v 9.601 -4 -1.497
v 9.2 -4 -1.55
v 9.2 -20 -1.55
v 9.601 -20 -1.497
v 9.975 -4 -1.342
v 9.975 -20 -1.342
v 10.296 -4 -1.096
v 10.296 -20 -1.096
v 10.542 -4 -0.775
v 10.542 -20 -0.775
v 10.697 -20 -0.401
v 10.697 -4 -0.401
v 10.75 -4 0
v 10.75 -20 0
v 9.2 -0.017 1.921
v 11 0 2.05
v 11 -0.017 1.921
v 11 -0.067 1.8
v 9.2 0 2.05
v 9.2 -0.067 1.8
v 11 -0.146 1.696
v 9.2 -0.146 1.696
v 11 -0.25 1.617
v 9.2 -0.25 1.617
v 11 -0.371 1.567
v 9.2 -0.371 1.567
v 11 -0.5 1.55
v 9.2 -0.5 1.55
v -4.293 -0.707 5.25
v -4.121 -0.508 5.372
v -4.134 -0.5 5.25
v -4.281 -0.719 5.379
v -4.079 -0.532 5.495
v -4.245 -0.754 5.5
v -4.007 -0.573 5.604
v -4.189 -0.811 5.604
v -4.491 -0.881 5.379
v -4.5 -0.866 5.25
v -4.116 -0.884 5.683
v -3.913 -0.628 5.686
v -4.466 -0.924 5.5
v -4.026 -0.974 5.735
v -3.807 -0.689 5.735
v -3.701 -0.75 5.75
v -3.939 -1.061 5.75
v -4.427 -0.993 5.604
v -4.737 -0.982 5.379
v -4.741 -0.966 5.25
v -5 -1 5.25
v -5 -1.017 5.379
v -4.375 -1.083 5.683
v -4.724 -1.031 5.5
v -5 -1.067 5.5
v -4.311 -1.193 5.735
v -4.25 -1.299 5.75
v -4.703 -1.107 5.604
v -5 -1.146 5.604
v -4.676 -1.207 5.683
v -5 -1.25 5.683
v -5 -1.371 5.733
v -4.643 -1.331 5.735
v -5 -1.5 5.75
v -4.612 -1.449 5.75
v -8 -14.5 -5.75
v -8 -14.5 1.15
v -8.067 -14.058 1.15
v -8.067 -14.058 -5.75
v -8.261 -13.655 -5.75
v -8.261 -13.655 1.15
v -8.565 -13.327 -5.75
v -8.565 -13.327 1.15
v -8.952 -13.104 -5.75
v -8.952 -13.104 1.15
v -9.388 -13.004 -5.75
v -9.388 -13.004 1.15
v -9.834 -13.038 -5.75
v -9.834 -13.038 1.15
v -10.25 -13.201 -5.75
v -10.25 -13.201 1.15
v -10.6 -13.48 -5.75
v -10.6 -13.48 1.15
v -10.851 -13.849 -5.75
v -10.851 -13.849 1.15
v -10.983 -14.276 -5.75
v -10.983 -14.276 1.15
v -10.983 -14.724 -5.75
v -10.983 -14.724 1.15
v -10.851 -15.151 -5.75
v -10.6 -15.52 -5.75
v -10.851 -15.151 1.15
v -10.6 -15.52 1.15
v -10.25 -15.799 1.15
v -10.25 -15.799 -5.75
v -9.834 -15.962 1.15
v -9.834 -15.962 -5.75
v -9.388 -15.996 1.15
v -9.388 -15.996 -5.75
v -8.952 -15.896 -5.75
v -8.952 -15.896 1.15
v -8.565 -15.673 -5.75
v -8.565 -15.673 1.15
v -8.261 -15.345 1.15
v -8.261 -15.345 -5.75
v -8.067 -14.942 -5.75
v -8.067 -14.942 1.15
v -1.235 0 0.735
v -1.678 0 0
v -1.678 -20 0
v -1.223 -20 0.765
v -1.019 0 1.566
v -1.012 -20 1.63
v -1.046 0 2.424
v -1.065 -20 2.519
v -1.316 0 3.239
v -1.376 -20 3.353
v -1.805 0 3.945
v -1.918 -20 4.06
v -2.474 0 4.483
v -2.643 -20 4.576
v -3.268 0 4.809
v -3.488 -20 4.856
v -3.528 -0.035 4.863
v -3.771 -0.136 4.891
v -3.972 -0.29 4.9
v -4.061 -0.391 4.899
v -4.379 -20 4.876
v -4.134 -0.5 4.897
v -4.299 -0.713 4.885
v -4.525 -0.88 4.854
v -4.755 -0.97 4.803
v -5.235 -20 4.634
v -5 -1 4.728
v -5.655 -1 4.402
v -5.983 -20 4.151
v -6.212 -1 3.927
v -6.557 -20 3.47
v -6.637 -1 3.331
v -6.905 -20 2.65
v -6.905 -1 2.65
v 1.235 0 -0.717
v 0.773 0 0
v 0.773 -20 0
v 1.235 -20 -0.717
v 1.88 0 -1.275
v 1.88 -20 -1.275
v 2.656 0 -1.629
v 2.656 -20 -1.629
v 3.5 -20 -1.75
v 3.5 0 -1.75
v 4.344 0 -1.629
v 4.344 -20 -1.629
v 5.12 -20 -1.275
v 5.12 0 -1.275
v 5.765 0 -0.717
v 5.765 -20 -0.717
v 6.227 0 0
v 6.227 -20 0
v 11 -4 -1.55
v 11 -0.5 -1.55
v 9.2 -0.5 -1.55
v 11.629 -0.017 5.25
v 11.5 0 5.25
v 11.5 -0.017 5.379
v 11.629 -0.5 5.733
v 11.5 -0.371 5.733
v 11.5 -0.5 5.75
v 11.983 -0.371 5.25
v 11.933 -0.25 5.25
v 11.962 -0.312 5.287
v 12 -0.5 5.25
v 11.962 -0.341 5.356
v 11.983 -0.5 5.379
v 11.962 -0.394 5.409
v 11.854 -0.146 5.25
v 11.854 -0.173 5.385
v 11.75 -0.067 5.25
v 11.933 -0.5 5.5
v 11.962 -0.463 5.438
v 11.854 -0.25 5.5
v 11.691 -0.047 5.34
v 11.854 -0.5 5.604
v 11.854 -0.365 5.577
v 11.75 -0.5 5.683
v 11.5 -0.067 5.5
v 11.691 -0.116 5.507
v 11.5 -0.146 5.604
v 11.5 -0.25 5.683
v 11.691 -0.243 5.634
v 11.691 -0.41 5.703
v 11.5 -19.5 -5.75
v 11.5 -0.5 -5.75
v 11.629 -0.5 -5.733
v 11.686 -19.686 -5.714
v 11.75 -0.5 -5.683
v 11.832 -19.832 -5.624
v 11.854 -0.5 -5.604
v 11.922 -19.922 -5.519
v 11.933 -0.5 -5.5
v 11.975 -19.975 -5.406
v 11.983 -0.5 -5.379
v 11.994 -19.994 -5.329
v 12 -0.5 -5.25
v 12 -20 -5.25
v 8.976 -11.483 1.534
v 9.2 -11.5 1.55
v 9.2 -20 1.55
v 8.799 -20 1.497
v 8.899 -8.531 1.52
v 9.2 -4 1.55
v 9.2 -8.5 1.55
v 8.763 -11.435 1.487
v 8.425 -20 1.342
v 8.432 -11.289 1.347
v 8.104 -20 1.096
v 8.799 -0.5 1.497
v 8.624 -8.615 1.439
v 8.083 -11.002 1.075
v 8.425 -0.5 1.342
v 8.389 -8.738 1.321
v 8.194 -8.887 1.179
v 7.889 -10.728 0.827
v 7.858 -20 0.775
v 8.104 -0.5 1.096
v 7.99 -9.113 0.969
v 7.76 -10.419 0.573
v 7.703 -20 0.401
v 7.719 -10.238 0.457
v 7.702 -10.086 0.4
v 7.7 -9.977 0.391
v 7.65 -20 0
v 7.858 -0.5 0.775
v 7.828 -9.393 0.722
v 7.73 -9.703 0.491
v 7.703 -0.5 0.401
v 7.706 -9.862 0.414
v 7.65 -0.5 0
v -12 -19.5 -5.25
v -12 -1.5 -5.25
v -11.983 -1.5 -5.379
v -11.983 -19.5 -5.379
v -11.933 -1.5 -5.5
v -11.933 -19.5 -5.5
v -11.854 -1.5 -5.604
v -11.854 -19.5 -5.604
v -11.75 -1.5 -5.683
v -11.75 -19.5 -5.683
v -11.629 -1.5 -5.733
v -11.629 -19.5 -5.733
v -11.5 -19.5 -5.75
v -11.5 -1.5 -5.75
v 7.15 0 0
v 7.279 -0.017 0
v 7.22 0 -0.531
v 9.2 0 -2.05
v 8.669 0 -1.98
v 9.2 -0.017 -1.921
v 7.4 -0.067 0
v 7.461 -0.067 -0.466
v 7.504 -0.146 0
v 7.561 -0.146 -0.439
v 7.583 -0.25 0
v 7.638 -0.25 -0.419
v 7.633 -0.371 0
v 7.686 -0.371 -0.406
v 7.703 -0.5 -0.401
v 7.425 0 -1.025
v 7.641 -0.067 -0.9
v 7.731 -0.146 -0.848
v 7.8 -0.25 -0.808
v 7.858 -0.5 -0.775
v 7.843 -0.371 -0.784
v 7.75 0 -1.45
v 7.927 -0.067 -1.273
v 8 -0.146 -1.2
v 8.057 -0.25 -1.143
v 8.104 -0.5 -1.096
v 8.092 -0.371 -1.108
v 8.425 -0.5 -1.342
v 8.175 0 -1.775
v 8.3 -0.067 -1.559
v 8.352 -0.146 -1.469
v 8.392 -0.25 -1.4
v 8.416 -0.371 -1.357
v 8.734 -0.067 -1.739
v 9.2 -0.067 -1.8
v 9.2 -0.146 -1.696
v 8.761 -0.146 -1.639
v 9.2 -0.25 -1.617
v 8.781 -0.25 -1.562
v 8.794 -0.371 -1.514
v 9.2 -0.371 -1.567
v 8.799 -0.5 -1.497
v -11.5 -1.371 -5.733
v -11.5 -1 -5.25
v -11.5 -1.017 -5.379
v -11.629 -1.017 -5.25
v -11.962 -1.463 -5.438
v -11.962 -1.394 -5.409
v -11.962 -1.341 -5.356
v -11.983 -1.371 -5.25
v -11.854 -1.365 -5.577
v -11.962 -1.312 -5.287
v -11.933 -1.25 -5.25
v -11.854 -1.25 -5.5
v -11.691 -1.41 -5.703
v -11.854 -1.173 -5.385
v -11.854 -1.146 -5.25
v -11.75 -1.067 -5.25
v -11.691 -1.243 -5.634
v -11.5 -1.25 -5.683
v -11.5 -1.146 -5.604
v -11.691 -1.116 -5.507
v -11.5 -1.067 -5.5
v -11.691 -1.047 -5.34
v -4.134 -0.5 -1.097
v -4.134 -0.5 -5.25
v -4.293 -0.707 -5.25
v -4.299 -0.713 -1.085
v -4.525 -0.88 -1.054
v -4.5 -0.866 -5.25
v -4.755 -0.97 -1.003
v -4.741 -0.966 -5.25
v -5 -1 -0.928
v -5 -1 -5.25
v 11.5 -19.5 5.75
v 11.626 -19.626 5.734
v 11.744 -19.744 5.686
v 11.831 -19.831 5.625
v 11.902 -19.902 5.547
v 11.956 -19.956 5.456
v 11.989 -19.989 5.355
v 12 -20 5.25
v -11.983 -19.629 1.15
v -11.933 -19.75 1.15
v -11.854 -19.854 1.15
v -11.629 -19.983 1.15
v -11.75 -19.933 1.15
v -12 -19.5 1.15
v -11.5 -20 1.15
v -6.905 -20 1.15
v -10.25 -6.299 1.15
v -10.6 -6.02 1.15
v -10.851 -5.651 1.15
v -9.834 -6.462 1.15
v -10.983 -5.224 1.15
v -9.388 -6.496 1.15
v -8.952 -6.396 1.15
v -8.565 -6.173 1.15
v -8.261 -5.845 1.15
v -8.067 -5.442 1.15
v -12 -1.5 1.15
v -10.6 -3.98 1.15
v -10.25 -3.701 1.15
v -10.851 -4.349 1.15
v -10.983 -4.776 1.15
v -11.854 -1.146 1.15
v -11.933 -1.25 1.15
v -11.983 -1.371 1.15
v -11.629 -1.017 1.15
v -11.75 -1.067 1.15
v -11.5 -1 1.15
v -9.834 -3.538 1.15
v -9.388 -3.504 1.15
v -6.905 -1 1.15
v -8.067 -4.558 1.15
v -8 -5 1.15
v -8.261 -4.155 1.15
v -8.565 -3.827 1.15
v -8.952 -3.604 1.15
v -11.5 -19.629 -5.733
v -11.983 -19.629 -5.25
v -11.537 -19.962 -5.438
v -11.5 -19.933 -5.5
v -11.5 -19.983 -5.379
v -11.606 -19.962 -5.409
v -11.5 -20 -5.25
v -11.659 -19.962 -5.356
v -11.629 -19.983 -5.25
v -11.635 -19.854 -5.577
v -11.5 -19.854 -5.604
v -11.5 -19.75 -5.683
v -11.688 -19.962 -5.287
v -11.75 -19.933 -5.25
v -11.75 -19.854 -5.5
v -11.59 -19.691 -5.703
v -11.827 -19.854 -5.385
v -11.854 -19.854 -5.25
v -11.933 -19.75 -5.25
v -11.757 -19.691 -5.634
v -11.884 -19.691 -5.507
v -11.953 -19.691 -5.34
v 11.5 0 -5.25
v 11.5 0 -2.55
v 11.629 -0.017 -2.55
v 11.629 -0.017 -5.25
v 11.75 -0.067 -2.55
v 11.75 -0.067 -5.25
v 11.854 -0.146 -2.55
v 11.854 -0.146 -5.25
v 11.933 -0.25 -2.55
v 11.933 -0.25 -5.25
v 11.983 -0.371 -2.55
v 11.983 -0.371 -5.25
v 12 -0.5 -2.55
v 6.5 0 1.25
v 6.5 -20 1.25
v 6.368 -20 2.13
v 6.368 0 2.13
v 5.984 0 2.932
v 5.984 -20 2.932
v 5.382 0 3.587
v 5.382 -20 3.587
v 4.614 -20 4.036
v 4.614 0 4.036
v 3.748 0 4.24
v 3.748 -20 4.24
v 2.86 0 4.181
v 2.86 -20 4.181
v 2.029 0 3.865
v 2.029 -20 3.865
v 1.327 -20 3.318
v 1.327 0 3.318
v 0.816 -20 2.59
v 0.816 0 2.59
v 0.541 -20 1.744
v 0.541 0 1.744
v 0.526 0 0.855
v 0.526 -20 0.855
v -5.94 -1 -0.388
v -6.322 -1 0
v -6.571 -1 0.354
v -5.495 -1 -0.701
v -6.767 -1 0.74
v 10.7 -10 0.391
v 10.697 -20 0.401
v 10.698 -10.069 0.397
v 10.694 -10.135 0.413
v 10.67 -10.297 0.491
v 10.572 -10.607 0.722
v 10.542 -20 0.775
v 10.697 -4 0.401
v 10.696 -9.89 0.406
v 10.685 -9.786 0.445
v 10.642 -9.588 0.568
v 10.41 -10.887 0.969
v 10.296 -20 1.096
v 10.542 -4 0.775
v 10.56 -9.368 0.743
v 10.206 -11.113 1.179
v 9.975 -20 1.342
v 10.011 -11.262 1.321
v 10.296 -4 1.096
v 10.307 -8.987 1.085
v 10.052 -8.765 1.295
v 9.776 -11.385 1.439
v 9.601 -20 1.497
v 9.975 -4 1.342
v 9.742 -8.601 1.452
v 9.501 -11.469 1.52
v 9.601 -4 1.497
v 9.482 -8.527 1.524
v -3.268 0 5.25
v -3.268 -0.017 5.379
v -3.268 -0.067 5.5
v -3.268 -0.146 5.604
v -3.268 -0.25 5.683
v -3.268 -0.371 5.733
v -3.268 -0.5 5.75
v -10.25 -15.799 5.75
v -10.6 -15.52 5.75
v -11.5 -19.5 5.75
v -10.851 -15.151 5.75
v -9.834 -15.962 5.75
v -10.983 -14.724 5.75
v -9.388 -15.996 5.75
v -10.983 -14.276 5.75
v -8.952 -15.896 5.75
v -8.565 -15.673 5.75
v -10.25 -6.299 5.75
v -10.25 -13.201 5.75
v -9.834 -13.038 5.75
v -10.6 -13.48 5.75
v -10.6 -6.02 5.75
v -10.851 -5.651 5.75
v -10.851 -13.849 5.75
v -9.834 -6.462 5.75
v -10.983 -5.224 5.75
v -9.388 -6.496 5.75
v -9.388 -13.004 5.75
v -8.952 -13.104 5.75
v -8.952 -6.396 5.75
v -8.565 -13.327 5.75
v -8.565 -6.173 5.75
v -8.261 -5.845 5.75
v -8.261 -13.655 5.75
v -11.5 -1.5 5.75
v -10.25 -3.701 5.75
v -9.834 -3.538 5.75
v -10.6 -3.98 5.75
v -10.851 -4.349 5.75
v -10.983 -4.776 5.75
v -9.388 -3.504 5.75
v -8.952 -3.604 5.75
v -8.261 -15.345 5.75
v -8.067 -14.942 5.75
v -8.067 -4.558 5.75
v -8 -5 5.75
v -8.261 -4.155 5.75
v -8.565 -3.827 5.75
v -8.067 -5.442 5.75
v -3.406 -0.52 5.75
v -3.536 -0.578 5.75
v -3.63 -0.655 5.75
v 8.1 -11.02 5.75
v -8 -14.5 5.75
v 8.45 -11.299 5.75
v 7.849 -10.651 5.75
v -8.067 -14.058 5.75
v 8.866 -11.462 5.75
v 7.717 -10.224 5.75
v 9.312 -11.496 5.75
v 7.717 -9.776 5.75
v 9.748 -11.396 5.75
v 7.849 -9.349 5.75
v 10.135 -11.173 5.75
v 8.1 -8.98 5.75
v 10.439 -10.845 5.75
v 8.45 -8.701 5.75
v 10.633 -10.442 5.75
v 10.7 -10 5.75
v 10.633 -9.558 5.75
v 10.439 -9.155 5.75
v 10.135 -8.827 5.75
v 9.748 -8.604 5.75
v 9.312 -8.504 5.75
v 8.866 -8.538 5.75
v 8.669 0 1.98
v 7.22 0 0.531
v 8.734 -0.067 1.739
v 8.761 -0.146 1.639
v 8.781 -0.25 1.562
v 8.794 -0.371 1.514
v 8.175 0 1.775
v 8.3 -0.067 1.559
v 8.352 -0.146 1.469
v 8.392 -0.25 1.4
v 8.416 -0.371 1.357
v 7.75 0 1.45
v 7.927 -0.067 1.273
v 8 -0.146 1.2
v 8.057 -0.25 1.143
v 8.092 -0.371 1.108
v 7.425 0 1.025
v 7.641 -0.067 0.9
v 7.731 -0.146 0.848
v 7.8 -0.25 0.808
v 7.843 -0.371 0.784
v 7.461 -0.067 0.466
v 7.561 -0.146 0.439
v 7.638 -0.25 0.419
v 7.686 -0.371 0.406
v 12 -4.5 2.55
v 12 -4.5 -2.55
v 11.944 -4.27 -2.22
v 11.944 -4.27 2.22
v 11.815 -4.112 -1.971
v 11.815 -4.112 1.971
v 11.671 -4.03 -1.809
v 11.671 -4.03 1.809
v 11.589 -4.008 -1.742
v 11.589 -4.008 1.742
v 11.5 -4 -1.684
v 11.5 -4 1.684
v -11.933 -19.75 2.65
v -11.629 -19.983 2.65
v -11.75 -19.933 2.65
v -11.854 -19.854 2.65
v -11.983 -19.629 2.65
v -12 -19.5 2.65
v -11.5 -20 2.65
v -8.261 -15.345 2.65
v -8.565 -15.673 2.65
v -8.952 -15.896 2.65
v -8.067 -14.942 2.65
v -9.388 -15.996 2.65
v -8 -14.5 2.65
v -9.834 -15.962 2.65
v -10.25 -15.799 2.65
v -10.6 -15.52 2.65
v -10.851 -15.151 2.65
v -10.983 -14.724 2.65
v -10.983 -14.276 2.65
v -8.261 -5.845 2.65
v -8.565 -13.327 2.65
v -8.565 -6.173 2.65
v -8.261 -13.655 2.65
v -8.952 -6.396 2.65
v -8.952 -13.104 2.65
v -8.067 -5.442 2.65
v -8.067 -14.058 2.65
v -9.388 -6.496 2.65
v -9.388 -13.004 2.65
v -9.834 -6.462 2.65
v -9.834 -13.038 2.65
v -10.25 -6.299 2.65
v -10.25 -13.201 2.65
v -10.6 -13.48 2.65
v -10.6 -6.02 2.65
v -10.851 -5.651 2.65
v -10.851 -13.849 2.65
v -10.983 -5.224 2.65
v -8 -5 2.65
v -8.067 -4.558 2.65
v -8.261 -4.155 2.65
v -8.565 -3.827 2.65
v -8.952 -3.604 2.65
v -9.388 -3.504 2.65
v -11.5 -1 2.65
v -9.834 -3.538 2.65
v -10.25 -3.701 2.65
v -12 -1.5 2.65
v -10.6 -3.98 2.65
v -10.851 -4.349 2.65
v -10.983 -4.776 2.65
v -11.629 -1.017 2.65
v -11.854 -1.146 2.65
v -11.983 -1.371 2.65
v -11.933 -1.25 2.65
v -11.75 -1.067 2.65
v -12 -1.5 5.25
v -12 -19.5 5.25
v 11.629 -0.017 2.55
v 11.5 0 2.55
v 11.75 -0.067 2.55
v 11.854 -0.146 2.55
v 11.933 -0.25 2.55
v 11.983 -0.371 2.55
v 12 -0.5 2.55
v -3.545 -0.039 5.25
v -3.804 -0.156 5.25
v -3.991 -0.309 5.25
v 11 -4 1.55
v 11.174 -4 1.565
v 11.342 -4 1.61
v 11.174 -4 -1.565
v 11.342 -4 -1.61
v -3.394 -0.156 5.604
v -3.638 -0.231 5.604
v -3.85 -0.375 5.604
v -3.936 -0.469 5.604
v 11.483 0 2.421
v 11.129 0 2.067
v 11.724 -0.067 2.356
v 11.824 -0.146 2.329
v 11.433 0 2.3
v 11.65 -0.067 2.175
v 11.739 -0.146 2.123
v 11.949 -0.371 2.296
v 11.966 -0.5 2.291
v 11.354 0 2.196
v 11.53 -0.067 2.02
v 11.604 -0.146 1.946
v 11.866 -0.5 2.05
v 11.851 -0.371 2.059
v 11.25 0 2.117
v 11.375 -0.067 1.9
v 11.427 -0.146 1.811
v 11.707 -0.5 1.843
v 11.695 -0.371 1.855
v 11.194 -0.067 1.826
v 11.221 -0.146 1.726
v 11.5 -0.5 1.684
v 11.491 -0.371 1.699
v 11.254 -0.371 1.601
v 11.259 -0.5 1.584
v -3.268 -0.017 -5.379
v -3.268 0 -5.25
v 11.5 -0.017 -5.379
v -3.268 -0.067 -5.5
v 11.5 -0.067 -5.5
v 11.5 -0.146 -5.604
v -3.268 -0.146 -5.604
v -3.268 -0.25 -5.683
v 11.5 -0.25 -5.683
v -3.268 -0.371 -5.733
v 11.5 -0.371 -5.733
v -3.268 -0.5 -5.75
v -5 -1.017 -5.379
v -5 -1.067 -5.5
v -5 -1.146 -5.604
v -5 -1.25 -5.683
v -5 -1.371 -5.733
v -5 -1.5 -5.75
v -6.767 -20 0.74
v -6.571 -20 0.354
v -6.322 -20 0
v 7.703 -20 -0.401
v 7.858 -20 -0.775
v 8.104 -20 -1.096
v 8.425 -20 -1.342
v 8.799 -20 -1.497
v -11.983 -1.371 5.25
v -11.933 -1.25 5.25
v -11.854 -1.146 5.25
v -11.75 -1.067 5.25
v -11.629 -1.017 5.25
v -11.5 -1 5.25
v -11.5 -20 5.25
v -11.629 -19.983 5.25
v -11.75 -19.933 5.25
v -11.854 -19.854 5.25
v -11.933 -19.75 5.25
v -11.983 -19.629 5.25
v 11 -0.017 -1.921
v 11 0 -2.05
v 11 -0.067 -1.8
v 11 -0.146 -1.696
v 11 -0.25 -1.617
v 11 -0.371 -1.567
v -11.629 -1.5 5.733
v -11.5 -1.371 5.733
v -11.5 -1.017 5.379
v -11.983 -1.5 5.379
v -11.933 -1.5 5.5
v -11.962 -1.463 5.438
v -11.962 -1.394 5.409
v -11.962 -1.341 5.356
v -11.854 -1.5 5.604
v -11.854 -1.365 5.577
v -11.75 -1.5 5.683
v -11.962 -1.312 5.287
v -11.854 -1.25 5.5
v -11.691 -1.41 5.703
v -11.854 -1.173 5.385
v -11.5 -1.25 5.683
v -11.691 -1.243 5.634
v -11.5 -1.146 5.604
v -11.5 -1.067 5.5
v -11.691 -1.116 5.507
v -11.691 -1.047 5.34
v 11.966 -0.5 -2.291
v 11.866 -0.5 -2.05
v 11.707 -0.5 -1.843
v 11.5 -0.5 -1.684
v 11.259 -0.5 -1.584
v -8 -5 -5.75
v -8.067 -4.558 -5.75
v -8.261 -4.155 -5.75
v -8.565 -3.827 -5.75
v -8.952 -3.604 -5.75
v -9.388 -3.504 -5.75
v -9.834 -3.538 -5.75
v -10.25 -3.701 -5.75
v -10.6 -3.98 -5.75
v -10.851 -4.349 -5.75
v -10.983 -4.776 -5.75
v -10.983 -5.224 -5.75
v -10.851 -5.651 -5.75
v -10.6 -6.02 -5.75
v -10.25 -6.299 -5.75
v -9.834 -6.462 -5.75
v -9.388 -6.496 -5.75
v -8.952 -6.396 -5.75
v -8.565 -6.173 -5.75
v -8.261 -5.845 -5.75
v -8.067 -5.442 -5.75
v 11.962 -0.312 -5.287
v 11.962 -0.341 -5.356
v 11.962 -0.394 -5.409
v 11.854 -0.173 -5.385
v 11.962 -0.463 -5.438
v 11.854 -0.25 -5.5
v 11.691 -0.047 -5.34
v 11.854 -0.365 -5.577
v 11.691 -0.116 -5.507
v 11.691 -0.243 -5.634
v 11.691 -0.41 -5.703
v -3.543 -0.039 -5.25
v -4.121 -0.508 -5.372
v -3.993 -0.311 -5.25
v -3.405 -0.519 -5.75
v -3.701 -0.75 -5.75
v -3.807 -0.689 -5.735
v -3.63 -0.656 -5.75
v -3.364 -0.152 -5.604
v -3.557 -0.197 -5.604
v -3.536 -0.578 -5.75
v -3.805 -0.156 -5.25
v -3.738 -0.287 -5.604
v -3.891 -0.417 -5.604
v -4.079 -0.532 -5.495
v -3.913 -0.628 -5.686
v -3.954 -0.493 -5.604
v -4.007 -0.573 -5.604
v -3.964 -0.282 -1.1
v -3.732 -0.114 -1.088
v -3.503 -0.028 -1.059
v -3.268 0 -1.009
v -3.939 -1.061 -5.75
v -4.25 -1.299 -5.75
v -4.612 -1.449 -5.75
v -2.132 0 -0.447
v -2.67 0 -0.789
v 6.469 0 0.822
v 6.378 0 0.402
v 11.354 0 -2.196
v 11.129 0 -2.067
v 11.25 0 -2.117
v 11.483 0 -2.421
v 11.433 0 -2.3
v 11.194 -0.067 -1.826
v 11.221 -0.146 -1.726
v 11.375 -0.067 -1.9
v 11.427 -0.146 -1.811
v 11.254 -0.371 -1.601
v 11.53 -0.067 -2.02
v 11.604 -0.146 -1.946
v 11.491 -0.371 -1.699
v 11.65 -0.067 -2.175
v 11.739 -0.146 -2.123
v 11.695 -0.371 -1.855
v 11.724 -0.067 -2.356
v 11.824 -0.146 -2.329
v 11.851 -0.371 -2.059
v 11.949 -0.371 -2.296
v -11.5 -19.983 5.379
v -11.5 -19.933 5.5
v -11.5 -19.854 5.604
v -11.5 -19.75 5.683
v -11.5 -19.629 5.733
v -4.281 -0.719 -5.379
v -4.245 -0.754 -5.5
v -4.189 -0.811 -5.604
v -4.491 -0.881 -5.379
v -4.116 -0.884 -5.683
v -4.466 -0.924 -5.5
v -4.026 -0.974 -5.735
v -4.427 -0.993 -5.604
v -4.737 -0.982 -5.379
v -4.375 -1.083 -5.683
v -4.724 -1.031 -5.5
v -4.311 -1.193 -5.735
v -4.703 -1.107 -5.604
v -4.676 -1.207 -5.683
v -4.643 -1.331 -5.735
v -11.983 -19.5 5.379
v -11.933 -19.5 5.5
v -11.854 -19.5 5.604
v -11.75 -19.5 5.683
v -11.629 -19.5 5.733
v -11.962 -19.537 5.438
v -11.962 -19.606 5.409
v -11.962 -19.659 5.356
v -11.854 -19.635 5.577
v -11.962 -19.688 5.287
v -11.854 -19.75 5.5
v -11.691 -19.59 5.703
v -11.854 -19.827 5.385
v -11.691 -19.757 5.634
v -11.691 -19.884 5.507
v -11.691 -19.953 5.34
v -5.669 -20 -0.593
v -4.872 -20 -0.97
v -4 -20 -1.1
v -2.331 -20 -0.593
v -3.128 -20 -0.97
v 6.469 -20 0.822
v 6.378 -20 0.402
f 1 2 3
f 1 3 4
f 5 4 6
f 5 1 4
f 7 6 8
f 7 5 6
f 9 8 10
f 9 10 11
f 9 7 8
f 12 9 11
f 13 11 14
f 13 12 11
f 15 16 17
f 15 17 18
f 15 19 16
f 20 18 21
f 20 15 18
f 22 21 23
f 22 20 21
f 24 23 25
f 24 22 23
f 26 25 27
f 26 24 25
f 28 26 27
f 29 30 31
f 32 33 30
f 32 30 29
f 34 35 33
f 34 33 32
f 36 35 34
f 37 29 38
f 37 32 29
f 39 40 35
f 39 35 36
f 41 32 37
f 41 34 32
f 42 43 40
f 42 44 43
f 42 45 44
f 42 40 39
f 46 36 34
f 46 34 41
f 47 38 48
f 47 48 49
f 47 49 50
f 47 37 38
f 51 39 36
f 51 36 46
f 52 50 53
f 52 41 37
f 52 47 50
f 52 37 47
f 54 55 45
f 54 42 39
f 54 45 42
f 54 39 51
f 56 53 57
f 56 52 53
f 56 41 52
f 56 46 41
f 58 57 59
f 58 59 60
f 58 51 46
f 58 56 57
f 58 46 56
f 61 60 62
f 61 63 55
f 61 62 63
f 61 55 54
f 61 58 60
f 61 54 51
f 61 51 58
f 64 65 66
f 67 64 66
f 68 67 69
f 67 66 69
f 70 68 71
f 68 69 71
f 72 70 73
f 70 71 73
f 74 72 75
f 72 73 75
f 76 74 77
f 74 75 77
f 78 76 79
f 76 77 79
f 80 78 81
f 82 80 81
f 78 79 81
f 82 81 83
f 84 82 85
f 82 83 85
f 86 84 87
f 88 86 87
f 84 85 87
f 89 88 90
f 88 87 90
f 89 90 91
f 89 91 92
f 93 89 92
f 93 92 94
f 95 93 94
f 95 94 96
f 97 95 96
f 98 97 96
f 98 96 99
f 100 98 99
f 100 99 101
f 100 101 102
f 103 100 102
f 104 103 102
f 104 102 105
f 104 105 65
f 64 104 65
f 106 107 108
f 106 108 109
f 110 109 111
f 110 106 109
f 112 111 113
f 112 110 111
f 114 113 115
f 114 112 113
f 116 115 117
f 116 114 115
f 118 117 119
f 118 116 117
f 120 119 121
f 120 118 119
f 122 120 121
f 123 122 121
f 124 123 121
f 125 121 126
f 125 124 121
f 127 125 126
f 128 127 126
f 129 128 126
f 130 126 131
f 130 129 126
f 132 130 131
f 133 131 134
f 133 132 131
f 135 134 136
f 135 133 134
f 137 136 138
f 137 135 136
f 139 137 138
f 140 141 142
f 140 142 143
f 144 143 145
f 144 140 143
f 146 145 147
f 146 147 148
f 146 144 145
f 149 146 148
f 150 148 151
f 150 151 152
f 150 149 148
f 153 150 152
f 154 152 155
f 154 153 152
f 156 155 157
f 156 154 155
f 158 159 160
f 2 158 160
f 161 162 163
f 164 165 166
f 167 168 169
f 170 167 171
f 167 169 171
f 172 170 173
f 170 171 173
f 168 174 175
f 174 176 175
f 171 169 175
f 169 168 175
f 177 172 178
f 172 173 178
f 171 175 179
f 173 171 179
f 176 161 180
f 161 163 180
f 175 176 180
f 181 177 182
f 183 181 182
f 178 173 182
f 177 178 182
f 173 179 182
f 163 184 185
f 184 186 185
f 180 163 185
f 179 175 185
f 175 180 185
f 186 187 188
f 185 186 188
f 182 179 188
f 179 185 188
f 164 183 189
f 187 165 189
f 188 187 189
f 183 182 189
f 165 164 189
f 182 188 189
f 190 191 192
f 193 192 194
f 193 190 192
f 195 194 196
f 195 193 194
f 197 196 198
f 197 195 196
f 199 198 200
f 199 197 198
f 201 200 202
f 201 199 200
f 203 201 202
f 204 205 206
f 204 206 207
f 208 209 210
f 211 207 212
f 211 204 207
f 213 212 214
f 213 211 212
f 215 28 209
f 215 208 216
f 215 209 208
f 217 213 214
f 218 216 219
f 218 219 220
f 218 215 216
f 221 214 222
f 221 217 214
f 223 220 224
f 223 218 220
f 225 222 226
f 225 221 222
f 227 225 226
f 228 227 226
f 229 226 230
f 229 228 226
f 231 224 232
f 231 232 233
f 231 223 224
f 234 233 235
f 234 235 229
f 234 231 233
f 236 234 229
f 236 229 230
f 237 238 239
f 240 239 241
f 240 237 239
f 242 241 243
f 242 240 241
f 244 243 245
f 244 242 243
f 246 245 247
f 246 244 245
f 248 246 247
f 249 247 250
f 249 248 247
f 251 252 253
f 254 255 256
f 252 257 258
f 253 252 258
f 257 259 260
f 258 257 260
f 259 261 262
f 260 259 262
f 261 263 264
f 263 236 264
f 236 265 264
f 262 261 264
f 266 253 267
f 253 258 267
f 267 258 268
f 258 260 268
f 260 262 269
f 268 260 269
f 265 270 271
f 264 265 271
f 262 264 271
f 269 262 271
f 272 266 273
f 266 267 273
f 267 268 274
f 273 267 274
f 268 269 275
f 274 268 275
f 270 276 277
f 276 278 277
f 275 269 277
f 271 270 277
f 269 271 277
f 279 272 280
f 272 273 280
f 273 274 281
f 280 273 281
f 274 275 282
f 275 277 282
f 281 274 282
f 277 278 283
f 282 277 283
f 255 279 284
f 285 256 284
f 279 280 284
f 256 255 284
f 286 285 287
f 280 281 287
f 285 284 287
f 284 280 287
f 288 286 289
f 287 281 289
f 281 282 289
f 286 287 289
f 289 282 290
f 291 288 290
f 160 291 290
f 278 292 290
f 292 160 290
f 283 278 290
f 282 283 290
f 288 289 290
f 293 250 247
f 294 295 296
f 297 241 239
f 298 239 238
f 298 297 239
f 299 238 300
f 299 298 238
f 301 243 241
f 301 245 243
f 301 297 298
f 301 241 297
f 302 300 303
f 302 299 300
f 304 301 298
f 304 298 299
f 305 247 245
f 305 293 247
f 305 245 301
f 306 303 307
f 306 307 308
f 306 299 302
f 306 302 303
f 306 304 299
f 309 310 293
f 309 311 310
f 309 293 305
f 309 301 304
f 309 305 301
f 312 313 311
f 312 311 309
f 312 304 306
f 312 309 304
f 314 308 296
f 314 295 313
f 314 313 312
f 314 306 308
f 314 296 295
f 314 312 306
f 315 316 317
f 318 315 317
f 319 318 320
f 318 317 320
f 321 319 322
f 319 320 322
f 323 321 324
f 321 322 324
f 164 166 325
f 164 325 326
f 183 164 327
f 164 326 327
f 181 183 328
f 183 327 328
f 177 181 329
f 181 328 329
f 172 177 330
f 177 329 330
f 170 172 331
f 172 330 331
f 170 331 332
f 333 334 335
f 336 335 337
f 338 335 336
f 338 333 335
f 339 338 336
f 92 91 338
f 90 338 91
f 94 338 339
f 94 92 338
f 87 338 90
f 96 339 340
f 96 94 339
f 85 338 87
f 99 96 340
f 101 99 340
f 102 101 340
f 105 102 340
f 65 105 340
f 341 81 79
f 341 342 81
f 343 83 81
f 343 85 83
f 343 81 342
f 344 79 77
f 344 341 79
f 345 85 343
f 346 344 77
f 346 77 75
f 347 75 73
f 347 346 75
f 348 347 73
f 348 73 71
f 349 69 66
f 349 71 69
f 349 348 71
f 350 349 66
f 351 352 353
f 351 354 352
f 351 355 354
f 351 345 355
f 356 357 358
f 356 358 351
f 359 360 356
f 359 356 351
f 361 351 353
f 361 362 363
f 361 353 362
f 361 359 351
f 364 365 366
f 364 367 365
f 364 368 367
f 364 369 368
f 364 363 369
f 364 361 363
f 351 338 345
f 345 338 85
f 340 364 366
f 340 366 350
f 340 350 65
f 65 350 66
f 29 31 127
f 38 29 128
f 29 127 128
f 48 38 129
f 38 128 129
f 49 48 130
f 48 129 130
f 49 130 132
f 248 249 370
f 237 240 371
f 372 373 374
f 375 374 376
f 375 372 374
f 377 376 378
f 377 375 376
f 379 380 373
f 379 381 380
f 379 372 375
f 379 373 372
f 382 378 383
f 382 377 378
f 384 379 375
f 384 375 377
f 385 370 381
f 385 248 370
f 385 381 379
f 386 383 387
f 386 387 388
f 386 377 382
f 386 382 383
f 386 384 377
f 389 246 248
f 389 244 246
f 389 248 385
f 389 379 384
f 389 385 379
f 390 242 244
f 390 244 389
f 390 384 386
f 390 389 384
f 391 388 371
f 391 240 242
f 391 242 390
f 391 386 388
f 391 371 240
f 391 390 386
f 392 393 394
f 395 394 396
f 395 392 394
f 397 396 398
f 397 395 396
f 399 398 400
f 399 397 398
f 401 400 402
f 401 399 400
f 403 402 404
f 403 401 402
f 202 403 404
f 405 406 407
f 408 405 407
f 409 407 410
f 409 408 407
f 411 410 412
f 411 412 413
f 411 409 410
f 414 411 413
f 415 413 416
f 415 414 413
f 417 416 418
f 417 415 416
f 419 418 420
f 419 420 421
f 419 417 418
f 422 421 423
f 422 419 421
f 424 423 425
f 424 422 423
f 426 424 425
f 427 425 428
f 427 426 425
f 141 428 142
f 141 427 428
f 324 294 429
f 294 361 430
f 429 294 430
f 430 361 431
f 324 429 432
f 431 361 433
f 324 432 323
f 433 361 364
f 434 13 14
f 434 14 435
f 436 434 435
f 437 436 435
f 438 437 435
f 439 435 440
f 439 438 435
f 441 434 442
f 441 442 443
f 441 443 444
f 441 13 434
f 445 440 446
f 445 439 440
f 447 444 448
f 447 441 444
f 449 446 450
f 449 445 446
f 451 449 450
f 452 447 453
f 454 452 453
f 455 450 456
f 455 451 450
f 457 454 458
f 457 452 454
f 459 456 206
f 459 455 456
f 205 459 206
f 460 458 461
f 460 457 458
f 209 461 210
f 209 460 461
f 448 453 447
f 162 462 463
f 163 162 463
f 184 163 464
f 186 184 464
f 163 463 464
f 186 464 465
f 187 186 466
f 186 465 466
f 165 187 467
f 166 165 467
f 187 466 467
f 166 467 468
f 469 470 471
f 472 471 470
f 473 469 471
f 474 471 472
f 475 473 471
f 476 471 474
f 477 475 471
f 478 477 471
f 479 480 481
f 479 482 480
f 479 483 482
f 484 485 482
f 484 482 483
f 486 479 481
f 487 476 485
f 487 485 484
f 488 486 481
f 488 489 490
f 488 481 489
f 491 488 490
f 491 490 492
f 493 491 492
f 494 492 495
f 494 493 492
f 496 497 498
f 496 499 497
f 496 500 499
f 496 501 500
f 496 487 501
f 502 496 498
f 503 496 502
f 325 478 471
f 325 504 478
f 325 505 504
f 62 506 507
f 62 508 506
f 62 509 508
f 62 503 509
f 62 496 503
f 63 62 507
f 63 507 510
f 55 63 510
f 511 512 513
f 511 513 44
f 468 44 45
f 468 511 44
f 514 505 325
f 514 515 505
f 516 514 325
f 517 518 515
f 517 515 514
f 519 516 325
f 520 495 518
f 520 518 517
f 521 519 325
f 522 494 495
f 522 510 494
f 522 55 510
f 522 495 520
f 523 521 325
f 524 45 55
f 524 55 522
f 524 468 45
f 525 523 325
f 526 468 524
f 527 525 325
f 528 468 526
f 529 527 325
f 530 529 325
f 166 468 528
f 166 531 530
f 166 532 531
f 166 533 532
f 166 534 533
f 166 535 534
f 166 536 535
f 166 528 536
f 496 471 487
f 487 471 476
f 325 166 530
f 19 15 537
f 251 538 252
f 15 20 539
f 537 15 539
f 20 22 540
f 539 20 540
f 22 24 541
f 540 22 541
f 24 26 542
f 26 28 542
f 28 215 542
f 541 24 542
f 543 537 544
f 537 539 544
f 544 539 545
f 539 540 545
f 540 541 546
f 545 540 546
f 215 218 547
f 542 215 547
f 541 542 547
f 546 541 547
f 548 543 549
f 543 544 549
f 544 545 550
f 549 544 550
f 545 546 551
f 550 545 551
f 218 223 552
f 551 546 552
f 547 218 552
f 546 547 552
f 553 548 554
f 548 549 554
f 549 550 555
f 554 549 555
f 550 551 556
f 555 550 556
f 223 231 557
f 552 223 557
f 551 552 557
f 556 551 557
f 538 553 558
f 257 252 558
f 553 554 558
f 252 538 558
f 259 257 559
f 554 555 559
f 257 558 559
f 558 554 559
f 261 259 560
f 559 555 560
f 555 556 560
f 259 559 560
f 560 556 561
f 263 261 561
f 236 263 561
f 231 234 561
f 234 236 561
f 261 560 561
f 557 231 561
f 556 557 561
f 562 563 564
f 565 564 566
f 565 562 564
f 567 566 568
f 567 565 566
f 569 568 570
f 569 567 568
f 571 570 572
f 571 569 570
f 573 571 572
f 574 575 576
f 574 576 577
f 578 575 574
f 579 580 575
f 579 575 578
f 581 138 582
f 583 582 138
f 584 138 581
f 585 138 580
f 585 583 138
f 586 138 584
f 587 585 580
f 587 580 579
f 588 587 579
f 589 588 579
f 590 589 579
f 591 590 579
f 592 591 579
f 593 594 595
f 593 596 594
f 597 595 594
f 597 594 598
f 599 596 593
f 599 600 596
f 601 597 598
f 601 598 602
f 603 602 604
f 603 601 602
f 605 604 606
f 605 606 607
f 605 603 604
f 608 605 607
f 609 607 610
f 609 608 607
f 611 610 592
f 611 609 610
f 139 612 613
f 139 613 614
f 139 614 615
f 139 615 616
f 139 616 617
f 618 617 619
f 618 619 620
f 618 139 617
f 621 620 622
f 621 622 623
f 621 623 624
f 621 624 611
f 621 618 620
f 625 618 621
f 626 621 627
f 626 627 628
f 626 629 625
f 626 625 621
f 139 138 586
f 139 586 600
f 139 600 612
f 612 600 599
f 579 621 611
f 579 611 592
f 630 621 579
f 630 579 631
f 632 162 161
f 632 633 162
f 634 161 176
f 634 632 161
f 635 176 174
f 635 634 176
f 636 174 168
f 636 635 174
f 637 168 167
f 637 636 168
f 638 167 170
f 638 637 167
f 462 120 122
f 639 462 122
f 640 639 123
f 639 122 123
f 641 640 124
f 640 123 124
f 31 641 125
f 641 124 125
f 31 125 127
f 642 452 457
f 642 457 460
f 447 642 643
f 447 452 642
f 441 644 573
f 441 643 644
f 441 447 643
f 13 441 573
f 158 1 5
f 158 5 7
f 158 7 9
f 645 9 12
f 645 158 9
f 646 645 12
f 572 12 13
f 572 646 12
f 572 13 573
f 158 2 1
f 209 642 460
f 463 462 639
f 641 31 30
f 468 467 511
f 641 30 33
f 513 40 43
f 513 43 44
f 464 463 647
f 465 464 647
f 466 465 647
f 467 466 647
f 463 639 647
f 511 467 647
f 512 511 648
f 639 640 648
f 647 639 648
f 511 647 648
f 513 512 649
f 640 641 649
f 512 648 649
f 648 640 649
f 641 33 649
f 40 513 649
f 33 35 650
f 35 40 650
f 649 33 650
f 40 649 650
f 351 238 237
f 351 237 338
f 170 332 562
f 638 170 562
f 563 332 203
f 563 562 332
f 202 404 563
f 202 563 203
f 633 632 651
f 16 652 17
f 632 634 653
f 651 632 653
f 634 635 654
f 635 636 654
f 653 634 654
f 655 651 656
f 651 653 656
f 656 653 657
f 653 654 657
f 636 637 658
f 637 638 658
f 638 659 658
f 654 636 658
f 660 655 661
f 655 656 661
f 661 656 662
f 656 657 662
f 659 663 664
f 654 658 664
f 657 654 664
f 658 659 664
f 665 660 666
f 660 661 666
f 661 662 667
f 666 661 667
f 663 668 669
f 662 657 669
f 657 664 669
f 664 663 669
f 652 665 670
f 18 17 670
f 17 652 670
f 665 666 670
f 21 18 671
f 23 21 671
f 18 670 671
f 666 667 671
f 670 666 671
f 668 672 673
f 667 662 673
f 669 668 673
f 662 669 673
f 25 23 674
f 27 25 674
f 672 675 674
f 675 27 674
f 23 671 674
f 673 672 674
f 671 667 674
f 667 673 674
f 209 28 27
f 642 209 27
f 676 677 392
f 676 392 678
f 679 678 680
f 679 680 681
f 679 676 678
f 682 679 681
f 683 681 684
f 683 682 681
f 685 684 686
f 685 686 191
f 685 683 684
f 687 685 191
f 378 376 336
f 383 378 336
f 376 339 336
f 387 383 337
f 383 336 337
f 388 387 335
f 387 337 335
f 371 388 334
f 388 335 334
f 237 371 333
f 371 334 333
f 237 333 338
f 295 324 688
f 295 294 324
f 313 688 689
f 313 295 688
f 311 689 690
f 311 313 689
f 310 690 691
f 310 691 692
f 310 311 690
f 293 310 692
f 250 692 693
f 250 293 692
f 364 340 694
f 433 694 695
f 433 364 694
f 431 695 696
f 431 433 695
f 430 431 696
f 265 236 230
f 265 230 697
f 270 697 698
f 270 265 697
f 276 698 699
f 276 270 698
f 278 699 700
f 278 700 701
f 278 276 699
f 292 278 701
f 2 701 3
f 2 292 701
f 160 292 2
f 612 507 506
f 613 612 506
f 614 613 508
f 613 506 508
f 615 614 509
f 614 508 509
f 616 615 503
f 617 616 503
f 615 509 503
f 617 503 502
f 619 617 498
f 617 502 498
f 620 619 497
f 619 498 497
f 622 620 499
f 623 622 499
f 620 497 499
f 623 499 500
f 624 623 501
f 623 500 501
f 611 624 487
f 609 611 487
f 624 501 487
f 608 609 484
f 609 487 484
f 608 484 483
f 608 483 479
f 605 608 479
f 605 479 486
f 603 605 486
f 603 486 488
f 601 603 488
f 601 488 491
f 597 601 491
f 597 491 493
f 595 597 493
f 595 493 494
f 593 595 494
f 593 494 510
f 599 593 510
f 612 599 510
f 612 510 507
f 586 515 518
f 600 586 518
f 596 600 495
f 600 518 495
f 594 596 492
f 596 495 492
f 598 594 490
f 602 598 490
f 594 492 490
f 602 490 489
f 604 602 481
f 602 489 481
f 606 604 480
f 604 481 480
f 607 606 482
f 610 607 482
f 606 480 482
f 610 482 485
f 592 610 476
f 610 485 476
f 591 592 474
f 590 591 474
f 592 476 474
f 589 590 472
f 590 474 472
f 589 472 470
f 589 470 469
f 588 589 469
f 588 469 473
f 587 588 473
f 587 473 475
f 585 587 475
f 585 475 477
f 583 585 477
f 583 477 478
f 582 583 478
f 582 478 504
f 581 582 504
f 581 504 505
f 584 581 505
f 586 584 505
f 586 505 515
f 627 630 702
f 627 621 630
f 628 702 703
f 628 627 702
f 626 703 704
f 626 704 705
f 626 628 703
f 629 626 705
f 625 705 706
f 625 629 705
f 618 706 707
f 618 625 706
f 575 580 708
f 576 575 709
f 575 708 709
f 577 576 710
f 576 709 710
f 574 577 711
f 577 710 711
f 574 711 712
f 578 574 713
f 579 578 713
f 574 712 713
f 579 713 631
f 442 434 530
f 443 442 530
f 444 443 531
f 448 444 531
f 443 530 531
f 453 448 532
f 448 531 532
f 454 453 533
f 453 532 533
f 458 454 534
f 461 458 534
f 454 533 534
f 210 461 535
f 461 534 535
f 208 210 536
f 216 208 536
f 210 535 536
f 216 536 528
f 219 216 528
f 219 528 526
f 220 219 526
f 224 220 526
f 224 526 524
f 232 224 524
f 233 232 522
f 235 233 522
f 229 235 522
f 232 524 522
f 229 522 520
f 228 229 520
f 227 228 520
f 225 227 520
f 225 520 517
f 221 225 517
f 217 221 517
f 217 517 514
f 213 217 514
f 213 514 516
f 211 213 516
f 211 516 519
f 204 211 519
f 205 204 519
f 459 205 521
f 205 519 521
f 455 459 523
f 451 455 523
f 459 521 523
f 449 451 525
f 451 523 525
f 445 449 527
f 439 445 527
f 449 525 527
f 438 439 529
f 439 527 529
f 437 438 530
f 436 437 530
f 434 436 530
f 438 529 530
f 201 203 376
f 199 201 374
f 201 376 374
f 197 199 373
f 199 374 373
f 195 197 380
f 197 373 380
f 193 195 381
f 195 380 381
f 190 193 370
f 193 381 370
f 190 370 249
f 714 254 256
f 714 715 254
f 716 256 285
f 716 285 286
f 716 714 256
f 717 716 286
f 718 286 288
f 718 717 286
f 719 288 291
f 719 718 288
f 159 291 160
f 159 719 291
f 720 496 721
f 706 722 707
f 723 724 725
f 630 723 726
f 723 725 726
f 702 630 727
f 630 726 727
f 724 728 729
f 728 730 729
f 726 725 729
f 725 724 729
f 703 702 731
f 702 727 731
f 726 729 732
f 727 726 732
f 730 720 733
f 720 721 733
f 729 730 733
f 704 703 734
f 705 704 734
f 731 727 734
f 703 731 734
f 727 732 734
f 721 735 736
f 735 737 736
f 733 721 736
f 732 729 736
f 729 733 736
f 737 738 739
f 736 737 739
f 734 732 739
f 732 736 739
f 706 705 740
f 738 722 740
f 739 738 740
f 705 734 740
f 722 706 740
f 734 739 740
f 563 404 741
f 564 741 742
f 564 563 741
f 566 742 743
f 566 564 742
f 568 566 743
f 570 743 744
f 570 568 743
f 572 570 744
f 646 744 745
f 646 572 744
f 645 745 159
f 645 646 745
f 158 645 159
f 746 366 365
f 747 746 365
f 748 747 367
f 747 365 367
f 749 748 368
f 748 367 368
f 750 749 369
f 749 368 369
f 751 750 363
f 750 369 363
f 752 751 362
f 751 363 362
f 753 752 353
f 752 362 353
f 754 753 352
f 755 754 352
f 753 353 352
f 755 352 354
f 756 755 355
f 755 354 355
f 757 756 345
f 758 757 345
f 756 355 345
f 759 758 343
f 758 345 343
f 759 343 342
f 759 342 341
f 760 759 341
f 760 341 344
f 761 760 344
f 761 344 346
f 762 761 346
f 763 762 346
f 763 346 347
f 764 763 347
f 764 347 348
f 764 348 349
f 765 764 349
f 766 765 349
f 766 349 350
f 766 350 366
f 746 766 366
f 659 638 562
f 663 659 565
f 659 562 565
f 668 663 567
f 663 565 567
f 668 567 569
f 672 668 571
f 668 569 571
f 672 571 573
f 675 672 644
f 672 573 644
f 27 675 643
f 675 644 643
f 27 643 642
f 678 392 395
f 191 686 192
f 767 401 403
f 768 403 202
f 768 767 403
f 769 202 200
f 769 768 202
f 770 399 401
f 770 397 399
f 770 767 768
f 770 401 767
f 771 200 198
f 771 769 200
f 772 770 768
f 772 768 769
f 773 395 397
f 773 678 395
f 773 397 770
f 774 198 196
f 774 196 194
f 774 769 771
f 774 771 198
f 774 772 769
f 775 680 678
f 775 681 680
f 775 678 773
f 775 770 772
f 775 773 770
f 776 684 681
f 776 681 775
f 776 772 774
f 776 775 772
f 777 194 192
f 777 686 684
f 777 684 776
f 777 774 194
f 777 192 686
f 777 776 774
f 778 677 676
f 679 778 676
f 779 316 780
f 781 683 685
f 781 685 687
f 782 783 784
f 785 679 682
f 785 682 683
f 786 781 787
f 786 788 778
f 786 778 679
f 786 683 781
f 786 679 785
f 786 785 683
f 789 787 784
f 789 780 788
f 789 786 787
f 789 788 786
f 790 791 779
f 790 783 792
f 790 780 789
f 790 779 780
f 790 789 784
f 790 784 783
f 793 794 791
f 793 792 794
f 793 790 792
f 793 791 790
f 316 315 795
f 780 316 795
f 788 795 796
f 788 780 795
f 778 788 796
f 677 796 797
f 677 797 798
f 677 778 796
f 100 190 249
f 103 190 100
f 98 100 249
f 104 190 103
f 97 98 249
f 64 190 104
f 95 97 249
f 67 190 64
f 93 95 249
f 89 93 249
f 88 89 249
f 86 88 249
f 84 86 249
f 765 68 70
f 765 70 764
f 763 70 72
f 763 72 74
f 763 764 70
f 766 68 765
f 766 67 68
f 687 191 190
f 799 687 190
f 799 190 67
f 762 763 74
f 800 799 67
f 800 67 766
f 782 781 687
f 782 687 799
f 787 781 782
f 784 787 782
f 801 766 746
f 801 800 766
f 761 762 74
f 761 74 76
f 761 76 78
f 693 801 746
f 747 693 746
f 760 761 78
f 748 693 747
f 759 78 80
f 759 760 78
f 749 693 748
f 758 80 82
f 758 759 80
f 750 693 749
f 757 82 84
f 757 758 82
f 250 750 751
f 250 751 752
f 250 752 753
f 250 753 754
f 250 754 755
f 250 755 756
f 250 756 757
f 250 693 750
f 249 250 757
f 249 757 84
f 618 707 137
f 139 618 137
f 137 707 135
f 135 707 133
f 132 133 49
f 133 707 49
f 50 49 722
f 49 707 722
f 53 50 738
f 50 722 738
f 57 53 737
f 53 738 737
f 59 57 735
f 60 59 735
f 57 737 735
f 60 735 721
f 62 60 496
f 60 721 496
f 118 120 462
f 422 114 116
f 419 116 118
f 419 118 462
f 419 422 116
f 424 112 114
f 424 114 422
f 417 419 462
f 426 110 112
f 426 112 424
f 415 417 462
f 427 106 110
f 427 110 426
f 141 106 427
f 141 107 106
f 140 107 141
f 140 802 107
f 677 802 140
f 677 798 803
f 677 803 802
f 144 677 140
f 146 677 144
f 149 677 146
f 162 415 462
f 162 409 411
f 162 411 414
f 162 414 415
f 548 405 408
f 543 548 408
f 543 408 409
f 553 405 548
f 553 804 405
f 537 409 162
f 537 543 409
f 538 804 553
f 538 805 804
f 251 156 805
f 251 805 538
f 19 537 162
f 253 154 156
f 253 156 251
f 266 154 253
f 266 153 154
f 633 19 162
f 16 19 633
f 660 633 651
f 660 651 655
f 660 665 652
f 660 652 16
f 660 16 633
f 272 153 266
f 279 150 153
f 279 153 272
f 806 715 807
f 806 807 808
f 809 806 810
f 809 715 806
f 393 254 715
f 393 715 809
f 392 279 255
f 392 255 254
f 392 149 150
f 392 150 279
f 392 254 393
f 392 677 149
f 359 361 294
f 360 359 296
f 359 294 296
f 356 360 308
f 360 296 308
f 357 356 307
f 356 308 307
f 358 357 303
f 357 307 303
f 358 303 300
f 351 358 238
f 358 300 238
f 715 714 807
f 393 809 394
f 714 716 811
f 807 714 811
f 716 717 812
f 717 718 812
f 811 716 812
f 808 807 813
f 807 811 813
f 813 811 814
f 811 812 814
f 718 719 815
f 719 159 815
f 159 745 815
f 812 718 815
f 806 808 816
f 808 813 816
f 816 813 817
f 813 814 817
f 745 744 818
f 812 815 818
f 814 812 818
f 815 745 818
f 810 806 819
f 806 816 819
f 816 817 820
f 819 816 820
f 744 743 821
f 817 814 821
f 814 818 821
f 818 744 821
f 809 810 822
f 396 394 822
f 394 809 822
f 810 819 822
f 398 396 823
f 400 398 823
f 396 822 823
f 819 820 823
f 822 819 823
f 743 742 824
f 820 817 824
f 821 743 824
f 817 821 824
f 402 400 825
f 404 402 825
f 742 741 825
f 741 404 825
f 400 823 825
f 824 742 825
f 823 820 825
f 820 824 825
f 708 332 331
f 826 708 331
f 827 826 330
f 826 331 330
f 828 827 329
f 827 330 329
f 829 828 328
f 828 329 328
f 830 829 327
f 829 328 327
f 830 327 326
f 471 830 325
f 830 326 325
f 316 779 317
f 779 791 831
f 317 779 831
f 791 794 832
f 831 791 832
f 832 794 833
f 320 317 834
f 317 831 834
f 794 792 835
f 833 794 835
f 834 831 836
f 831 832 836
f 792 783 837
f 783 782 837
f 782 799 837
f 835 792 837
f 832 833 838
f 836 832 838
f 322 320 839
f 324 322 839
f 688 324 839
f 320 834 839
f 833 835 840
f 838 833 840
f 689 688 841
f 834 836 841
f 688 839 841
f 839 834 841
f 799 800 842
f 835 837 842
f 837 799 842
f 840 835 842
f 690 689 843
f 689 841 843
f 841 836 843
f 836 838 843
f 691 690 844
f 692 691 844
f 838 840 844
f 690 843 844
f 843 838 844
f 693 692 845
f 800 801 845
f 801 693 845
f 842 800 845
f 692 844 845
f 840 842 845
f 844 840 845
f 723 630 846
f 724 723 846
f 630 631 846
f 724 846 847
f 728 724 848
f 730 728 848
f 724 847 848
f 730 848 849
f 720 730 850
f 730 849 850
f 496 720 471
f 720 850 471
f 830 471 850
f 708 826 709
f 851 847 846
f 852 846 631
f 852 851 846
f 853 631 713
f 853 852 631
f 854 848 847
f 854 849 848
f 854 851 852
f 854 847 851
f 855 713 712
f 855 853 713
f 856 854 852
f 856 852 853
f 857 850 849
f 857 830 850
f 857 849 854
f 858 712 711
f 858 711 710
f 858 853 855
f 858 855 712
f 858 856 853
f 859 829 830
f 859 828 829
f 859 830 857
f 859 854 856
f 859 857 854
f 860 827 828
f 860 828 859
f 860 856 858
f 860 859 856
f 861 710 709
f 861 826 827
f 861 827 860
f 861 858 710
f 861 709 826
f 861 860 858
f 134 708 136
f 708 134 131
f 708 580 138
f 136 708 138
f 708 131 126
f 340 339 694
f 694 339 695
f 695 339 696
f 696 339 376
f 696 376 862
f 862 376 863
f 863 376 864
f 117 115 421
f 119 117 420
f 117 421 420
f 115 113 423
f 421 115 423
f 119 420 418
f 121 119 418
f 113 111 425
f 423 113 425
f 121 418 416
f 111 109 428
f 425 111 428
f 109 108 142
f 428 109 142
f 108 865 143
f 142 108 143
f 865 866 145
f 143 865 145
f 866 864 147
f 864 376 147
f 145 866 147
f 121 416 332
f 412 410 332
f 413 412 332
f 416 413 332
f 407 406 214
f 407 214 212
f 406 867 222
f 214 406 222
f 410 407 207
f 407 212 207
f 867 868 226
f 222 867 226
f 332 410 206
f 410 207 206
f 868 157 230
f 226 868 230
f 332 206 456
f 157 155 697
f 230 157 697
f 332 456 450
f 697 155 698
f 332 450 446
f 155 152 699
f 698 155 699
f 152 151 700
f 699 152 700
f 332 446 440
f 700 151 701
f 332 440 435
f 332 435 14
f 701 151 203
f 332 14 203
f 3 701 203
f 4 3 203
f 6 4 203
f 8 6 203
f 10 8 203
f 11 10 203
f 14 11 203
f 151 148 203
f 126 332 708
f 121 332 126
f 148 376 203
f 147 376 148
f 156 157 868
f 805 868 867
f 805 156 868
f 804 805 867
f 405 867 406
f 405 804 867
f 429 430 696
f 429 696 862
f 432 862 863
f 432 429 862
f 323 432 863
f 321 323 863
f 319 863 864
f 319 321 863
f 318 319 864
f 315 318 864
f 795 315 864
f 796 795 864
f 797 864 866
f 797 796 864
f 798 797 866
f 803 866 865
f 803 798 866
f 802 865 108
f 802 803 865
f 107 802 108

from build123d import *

# Parameters (mm, degrees)
DODANIE_WYCI_GNI_CIE1_DEPTH = 20
WYTNIJ_WYCI_GNI_CIE1_DEPTH  = 4
SZKIC2_W                    = 8
SZKIC2_H                    = 1
WYTNIJ_WYCI_GNI_CIE2_DEPTH  = 27.004807248
SZKIC2_3_R                  = 1.5
WYTNIJ_WYCI_GNI_CIE3_DEPTH  = 5.5
SZKIC2_4_R                  = 1.5
WYTNIJ_WYCI_GNI_CIE4_DEPTH  = 27.004807325
ZAOKR_GLENIE1_R             = 1
ZAOKR_GLENIE2_R             = 1
ZAOKR_GLENIE3_R             = 1
ZAOKR_GLENIE4_R             = 0.5
ZAOKR_GLENIE5_R             = 0.5


with BuildPart() as part:
    # Szkic1 → Dodanie-wyciągnięcie1 (new body)
    with BuildSketch(Plane(origin=(0, 0, 0), x_dir=(1, 0, 0), z_dir=(0, 1, 0))):
        with BuildLine():
            Line((9.2, 1.55), (12, 1.55))
            Line((12, 1.55), (12, 5.75))
            Line((12, 5.75), (-12, 5.75))
            Line((-12, 5.75), (-12, 0))
            Line((-12, 0), (-6.321637353, 0))
            ThreePointArc((-6.321637353, 0), (-4, 1.1), (-1.678362647, 0))
            Line((-1.678362647, 0), (0.772821971, 0))
            ThreePointArc((0.772821971, 0), (3.5, 1.75), (6.227178029, 0))
            Line((6.227178029, 0), (7.65, 0))
            ThreePointArc((7.65, 0), (8.103984489, 1.096015511), (9.2, 1.55))
        make_face()
        with BuildLine():
            Line((-6.321637353, 0), (-12, 0))
            Line((-12, 0), (-12, -1.15))
            Line((-12, -1.15), (-6.90473751, -1.15))
            ThreePointArc((-6.90473751, -1.15), (-6.675700572, -0.543303111), (-6.321637353, 0))
        make_face()
        with BuildLine():
            Line((12, -5.75), (12, -1.55))
            Line((12, -1.55), (9.2, -1.55))
            ThreePointArc((9.2, -1.55), (8.103984489, -1.096015511), (7.65, 0))
            Line((7.65, 0), (6.227178029, 0))
            ThreePointArc((6.227178029, 0), (6.431001031, -0.610286817), (6.5, -1.25))
            ThreePointArc((6.5, -1.25), (2.860286817, -4.181001031), (0.772821971, 0))
            Line((0.772821971, 0), (-1.678362647, 0))
            ThreePointArc((-1.678362647, 0), (-2.643303111, -4.575700572), (-6.90473751, -2.65))
            Line((-6.90473751, -2.65), (-12, -2.65))
            Line((-12, -2.65), (-12, -5.75))
            Line((-12, -5.75), (12, -5.75))
        make_face()
        with BuildLine():
            Line((12, -1.55), (12, 0))
            Line((12, 0), (10.75, 0))
            ThreePointArc((10.75, 0), (10.296015511, -1.096015511), (9.2, -1.55))
            Line((9.2, -1.55), (12, -1.55))
        make_face()
        with BuildLine():
            Line((10.75, 0), (12, 0))
            Line((12, 0), (12, 1.55))
            Line((12, 1.55), (9.2, 1.55))
            ThreePointArc((9.2, 1.55), (10.296015511, 1.096015511), (10.75, 0))
        make_face()
    extrude(amount=-DODANIE_WYCI_GNI_CIE1_DEPTH)

    # Szkic1<4> → Wytnij-wyciągnięcie1 (cut)
    with BuildSketch(Plane(origin=(0, 0, 0), x_dir=(1, 0, 0), z_dir=(0, 1, 0))):
        with BuildLine():
            Line((10.75, 0), (12, 0))
            Line((12, 0), (12, 1.55))
            Line((12, 1.55), (9.2, 1.55))
            ThreePointArc((9.2, 1.55), (10.296015511, 1.096015511), (10.75, 0))
        make_face()
        with BuildLine():
            Line((12, -1.55), (12, 0))
            Line((12, 0), (10.75, 0))
            ThreePointArc((10.75, 0), (10.296015511, -1.096015511), (9.2, -1.55))
            Line((9.2, -1.55), (12, -1.55))
        make_face()
    extrude(amount=-WYTNIJ_WYCI_GNI_CIE1_DEPTH, mode=Mode.SUBTRACT)

    # Szkic2 → Wytnij-wyciągnięcie2 (cut, through all)
    with BuildSketch(Plane.XY.offset(5.75)):
        with Locations((-8, -0.5)):
            Rectangle(SZKIC2_W, SZKIC2_H)
    extrude(amount=-WYTNIJ_WYCI_GNI_CIE2_DEPTH, mode=Mode.SUBTRACT)

    # Szkic2<3> → Wytnij-wyciągnięcie3 (cut)
    with BuildSketch(Plane.XY.offset(5.75)):
        with Locations((9.2, -10)):
            Circle(SZKIC2_3_R)
    extrude(amount=-WYTNIJ_WYCI_GNI_CIE3_DEPTH, mode=Mode.SUBTRACT)

    # Szkic2<4> → Wytnij-wyciągnięcie4 (cut, through all)
    with BuildSketch(Plane.XY.offset(5.75)):
        with Locations((-9.5, -5)):
            Circle(SZKIC2_4_R)
        with Locations((-9.5, -14.5)):
            Circle(SZKIC2_4_R)
    extrude(amount=-WYTNIJ_WYCI_GNI_CIE4_DEPTH, mode=Mode.SUBTRACT)

    # Zaokrąglenie1
    zaokr_glenie1_edges = [part.edges().sort_by_distance(p)[0] for p in [
        (-4, -1, -3.425),
        (-4, -1, 5.325),
    ]]
    fillet(zaokr_glenie1_edges, radius=ZAOKR_GLENIE1_R - 0.0001)  # a hair under: the kernel refuses the full size

    # Zaokrąglenie2
    zaokr_glenie2_edges = [part.edges().sort_by_distance(p)[0] for p in [
        (-4, 0, 5.325),
        (-4, 0, -3.425),
    ]]
    fillet(zaokr_glenie2_edges, radius=ZAOKR_GLENIE2_R)

    # Zaokrąglenie3
    zaokr_glenie3_edges = [part.edges().sort_by_distance(p)[0] for p in [
        (12, -2, -1.55),
        (12, -2, 1.55),
    ]]
    fillet(zaokr_glenie3_edges, radius=ZAOKR_GLENIE3_R)

    # Zaokrąglenie4
    zaokr_glenie4_edges = [part.edges().sort_by_distance(p)[0] for p in [
        (-4.499937501, -0.866031585, -5.75),
        (-4.499937501, -0.866031585, 5.75),
        (-3.767919429, -0.133981813, 5.75),
        (-3.767919429, -0.133981813, -5.75),
        (12, 0, -4.15),
        (11.707106781, 0, -1.842893219),
        (11.707106781, 0, 1.842893219),
        (4.366046536, 0, -5.75),
        (12, 0, 4.15),
        (4.366046536, 0, 5.75),
        (0, -20, 5.75),
        (-12, -10.5, 5.75),
        (-12, -10.5, -5.75),
        (12, -10, -5.75),
        (12, -10, 5.75),
        (0, -20, -5.75),
        (-12, -20, -2.3),
        (7.65, 0, 0),
        (10.1, 0, -1.55),
        (10.1, 0, 1.55),
        (-12, -20, 4.2),
        (-8.49995, -1, -5.75),
        (-12, -1, 4.2),
        (-12, -1, -2.3),
        (-8.49995, -1, 5.75),
    ]]
    fillet(zaokr_glenie4_edges, radius=ZAOKR_GLENIE4_R)

    # Zaokrąglenie5
    zaokr_glenie5_edges = [part.edges().sort_by_distance(p)[0] for p in [
        (12, -4, 0),
    ]]
    fillet(zaokr_glenie5_edges, radius=ZAOKR_GLENIE5_R)


solid = part.part
